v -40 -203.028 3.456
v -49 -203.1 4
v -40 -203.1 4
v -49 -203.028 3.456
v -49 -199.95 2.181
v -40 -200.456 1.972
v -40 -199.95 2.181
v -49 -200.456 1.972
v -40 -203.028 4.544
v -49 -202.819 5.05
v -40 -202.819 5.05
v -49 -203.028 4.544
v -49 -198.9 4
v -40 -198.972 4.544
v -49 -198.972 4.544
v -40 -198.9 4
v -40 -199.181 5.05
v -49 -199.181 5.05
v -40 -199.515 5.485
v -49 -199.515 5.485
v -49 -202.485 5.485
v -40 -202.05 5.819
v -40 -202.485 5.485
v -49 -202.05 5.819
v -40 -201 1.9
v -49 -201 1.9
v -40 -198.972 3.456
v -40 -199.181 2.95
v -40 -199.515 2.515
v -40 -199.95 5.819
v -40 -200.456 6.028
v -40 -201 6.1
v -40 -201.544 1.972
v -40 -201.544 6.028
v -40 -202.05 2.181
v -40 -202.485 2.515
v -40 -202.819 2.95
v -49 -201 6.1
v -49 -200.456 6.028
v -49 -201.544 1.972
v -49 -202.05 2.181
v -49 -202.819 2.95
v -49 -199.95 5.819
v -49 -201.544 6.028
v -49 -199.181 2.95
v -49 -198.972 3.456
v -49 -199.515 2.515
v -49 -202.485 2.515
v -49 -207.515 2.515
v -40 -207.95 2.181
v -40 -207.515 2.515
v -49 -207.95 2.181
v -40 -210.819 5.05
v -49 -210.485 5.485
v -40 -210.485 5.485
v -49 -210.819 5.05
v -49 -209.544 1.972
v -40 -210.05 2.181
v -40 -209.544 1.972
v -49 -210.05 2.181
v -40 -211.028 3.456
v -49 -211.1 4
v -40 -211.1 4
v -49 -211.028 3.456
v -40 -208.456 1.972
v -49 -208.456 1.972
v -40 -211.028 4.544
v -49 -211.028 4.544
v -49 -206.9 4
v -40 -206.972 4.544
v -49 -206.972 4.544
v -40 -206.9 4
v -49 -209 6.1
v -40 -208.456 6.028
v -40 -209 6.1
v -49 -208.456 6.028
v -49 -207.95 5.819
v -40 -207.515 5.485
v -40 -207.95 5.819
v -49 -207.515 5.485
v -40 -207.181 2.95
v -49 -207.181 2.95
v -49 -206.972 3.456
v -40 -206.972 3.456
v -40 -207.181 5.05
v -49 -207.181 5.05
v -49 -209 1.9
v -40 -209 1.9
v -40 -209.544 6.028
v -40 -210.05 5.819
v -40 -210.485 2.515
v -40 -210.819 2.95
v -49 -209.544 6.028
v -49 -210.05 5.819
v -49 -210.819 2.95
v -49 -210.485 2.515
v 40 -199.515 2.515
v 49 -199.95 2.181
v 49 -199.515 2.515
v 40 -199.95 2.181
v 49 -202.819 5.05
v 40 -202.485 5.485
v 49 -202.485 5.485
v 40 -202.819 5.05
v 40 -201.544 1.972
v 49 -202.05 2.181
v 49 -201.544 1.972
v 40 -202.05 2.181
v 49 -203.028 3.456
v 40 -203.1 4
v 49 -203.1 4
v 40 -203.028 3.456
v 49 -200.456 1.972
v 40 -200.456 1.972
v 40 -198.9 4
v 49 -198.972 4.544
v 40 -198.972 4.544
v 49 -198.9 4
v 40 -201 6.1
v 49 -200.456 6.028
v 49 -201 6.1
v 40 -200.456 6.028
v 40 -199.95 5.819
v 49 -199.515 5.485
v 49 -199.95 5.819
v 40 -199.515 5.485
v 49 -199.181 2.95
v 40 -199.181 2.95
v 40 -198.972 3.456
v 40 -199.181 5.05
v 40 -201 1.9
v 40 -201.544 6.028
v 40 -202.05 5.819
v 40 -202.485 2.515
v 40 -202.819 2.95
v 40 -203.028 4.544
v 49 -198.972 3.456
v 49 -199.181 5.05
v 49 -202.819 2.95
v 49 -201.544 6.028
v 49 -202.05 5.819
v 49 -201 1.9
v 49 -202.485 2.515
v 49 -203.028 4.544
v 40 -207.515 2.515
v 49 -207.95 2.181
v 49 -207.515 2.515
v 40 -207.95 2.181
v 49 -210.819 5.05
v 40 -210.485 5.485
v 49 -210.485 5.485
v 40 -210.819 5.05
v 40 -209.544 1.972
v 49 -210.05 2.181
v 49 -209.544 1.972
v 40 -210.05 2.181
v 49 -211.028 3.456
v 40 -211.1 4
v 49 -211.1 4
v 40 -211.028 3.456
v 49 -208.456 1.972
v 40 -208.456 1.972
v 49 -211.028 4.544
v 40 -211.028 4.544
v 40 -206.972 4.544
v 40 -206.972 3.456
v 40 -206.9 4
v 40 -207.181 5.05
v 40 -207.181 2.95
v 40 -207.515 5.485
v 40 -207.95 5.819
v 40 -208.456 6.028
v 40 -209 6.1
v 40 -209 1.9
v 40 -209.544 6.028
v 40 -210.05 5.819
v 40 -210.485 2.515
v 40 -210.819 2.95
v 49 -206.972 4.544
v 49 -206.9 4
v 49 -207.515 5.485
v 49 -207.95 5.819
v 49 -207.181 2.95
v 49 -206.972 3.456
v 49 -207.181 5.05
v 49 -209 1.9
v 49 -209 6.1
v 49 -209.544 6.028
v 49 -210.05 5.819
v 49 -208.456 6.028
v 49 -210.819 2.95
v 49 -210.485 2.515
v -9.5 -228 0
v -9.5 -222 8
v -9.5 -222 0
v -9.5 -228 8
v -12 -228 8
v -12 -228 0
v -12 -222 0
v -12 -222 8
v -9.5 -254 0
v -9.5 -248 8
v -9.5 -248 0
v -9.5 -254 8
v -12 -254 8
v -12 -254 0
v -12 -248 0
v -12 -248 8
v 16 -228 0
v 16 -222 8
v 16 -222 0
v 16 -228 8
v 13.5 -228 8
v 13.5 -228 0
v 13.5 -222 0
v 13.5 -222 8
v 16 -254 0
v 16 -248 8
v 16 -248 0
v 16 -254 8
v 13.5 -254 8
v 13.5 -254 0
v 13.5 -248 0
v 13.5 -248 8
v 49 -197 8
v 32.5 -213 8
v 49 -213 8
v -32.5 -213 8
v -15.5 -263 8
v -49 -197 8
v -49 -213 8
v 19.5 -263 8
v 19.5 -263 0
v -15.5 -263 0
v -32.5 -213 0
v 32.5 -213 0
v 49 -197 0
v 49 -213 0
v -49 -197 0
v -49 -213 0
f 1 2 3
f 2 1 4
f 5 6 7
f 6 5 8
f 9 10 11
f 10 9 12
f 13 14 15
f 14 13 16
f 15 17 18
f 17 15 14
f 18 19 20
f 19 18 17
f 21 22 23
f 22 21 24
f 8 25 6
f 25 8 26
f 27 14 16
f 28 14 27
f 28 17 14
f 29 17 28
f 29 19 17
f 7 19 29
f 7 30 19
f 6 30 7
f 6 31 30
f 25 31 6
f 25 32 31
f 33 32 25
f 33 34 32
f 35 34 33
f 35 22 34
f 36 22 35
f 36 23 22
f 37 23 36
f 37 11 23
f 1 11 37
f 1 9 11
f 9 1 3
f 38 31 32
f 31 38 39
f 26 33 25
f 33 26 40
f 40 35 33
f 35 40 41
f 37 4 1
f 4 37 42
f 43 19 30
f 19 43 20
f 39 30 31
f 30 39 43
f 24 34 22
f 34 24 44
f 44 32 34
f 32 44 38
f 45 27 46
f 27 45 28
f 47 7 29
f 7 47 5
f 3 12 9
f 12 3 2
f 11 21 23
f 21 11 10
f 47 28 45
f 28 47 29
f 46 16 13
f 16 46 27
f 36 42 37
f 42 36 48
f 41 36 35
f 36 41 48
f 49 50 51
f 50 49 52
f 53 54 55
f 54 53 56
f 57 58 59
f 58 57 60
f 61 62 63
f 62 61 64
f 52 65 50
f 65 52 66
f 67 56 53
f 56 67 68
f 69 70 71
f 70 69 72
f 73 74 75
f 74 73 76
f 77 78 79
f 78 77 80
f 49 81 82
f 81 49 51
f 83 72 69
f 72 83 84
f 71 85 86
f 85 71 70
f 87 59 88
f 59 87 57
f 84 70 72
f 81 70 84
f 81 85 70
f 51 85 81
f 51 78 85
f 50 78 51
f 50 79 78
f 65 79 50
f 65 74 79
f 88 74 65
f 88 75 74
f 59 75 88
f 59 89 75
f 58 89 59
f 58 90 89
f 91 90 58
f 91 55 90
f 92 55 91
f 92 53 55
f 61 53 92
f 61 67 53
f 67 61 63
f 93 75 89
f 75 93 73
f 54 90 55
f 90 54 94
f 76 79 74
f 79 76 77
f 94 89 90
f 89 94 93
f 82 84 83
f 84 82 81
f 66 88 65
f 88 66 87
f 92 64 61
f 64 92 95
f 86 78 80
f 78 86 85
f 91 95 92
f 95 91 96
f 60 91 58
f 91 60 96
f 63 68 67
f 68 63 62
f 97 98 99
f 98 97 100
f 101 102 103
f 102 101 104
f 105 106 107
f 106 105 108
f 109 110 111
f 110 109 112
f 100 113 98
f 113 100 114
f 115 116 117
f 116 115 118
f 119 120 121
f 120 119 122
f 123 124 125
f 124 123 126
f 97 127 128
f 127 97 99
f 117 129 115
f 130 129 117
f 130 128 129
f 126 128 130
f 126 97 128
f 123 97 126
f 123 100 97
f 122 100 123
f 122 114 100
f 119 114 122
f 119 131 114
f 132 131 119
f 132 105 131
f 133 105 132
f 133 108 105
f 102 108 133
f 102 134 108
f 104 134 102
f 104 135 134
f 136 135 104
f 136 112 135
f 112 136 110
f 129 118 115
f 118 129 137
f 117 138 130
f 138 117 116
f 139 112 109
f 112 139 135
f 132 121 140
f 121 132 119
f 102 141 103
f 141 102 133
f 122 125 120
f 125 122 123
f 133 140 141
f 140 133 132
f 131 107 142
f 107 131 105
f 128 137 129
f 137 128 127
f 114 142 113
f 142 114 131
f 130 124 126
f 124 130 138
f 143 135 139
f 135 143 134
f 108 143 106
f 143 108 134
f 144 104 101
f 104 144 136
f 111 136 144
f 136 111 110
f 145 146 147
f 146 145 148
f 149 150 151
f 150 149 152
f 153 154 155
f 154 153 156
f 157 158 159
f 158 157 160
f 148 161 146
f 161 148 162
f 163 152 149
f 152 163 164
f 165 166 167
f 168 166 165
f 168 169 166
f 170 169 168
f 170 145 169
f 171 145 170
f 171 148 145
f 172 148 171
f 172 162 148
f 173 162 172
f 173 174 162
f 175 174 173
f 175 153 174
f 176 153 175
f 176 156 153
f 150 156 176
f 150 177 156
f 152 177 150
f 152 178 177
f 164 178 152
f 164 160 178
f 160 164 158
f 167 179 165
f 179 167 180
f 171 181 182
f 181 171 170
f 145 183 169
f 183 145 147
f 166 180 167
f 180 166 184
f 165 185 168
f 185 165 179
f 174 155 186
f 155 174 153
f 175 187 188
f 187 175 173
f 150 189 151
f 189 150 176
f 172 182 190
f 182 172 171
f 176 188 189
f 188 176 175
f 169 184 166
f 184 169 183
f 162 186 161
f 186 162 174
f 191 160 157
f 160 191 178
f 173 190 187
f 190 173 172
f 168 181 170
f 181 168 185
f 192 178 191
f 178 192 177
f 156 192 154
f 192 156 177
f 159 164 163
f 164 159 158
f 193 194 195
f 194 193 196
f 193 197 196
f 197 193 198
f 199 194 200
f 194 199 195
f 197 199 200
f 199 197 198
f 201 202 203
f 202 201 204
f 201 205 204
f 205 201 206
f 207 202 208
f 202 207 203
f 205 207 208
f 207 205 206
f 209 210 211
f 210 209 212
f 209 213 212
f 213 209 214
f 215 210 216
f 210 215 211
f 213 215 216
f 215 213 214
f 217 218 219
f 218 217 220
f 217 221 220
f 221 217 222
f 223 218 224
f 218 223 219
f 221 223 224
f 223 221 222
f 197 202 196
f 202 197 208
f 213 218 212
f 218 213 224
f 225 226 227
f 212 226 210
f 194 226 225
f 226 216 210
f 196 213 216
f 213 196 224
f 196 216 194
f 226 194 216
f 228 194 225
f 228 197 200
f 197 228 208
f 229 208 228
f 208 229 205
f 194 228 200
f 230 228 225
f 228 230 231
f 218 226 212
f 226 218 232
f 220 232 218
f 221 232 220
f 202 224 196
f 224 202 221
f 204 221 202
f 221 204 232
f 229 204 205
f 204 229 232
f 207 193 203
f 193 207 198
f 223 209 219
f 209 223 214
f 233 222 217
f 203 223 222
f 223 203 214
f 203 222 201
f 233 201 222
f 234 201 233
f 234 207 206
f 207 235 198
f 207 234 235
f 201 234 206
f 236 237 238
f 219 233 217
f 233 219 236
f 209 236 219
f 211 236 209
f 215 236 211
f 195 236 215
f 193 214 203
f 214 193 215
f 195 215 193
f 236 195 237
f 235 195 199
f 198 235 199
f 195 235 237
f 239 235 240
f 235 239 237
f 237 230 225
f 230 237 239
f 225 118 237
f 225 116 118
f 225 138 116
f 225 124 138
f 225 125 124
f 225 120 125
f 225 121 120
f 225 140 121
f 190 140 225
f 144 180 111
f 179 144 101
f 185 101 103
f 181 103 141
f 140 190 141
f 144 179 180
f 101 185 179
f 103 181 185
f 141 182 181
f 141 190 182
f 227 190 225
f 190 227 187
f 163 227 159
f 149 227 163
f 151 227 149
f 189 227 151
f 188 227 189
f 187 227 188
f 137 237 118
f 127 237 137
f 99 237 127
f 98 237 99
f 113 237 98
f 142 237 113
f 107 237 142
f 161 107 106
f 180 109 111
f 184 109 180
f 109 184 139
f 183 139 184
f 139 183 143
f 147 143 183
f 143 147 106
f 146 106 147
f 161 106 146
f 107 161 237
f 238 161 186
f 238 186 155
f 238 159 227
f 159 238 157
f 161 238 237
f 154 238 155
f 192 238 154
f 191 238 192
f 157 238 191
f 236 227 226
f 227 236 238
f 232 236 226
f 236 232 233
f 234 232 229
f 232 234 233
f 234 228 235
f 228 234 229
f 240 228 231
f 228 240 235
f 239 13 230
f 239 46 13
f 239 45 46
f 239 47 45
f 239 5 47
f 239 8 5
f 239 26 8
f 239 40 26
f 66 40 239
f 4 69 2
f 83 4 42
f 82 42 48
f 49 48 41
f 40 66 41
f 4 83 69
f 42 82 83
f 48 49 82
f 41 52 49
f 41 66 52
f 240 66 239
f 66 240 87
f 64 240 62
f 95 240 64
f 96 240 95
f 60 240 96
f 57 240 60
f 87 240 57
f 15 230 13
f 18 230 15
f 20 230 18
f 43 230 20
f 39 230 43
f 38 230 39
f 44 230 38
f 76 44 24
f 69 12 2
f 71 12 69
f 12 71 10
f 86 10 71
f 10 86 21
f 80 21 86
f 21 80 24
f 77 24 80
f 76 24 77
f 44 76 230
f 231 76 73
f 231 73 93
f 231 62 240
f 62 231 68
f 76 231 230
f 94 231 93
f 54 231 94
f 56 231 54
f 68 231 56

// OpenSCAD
include <../lib/meshtastic-drybag-node-lib.scad>;
$fn = 40;
bridge_print(true);
